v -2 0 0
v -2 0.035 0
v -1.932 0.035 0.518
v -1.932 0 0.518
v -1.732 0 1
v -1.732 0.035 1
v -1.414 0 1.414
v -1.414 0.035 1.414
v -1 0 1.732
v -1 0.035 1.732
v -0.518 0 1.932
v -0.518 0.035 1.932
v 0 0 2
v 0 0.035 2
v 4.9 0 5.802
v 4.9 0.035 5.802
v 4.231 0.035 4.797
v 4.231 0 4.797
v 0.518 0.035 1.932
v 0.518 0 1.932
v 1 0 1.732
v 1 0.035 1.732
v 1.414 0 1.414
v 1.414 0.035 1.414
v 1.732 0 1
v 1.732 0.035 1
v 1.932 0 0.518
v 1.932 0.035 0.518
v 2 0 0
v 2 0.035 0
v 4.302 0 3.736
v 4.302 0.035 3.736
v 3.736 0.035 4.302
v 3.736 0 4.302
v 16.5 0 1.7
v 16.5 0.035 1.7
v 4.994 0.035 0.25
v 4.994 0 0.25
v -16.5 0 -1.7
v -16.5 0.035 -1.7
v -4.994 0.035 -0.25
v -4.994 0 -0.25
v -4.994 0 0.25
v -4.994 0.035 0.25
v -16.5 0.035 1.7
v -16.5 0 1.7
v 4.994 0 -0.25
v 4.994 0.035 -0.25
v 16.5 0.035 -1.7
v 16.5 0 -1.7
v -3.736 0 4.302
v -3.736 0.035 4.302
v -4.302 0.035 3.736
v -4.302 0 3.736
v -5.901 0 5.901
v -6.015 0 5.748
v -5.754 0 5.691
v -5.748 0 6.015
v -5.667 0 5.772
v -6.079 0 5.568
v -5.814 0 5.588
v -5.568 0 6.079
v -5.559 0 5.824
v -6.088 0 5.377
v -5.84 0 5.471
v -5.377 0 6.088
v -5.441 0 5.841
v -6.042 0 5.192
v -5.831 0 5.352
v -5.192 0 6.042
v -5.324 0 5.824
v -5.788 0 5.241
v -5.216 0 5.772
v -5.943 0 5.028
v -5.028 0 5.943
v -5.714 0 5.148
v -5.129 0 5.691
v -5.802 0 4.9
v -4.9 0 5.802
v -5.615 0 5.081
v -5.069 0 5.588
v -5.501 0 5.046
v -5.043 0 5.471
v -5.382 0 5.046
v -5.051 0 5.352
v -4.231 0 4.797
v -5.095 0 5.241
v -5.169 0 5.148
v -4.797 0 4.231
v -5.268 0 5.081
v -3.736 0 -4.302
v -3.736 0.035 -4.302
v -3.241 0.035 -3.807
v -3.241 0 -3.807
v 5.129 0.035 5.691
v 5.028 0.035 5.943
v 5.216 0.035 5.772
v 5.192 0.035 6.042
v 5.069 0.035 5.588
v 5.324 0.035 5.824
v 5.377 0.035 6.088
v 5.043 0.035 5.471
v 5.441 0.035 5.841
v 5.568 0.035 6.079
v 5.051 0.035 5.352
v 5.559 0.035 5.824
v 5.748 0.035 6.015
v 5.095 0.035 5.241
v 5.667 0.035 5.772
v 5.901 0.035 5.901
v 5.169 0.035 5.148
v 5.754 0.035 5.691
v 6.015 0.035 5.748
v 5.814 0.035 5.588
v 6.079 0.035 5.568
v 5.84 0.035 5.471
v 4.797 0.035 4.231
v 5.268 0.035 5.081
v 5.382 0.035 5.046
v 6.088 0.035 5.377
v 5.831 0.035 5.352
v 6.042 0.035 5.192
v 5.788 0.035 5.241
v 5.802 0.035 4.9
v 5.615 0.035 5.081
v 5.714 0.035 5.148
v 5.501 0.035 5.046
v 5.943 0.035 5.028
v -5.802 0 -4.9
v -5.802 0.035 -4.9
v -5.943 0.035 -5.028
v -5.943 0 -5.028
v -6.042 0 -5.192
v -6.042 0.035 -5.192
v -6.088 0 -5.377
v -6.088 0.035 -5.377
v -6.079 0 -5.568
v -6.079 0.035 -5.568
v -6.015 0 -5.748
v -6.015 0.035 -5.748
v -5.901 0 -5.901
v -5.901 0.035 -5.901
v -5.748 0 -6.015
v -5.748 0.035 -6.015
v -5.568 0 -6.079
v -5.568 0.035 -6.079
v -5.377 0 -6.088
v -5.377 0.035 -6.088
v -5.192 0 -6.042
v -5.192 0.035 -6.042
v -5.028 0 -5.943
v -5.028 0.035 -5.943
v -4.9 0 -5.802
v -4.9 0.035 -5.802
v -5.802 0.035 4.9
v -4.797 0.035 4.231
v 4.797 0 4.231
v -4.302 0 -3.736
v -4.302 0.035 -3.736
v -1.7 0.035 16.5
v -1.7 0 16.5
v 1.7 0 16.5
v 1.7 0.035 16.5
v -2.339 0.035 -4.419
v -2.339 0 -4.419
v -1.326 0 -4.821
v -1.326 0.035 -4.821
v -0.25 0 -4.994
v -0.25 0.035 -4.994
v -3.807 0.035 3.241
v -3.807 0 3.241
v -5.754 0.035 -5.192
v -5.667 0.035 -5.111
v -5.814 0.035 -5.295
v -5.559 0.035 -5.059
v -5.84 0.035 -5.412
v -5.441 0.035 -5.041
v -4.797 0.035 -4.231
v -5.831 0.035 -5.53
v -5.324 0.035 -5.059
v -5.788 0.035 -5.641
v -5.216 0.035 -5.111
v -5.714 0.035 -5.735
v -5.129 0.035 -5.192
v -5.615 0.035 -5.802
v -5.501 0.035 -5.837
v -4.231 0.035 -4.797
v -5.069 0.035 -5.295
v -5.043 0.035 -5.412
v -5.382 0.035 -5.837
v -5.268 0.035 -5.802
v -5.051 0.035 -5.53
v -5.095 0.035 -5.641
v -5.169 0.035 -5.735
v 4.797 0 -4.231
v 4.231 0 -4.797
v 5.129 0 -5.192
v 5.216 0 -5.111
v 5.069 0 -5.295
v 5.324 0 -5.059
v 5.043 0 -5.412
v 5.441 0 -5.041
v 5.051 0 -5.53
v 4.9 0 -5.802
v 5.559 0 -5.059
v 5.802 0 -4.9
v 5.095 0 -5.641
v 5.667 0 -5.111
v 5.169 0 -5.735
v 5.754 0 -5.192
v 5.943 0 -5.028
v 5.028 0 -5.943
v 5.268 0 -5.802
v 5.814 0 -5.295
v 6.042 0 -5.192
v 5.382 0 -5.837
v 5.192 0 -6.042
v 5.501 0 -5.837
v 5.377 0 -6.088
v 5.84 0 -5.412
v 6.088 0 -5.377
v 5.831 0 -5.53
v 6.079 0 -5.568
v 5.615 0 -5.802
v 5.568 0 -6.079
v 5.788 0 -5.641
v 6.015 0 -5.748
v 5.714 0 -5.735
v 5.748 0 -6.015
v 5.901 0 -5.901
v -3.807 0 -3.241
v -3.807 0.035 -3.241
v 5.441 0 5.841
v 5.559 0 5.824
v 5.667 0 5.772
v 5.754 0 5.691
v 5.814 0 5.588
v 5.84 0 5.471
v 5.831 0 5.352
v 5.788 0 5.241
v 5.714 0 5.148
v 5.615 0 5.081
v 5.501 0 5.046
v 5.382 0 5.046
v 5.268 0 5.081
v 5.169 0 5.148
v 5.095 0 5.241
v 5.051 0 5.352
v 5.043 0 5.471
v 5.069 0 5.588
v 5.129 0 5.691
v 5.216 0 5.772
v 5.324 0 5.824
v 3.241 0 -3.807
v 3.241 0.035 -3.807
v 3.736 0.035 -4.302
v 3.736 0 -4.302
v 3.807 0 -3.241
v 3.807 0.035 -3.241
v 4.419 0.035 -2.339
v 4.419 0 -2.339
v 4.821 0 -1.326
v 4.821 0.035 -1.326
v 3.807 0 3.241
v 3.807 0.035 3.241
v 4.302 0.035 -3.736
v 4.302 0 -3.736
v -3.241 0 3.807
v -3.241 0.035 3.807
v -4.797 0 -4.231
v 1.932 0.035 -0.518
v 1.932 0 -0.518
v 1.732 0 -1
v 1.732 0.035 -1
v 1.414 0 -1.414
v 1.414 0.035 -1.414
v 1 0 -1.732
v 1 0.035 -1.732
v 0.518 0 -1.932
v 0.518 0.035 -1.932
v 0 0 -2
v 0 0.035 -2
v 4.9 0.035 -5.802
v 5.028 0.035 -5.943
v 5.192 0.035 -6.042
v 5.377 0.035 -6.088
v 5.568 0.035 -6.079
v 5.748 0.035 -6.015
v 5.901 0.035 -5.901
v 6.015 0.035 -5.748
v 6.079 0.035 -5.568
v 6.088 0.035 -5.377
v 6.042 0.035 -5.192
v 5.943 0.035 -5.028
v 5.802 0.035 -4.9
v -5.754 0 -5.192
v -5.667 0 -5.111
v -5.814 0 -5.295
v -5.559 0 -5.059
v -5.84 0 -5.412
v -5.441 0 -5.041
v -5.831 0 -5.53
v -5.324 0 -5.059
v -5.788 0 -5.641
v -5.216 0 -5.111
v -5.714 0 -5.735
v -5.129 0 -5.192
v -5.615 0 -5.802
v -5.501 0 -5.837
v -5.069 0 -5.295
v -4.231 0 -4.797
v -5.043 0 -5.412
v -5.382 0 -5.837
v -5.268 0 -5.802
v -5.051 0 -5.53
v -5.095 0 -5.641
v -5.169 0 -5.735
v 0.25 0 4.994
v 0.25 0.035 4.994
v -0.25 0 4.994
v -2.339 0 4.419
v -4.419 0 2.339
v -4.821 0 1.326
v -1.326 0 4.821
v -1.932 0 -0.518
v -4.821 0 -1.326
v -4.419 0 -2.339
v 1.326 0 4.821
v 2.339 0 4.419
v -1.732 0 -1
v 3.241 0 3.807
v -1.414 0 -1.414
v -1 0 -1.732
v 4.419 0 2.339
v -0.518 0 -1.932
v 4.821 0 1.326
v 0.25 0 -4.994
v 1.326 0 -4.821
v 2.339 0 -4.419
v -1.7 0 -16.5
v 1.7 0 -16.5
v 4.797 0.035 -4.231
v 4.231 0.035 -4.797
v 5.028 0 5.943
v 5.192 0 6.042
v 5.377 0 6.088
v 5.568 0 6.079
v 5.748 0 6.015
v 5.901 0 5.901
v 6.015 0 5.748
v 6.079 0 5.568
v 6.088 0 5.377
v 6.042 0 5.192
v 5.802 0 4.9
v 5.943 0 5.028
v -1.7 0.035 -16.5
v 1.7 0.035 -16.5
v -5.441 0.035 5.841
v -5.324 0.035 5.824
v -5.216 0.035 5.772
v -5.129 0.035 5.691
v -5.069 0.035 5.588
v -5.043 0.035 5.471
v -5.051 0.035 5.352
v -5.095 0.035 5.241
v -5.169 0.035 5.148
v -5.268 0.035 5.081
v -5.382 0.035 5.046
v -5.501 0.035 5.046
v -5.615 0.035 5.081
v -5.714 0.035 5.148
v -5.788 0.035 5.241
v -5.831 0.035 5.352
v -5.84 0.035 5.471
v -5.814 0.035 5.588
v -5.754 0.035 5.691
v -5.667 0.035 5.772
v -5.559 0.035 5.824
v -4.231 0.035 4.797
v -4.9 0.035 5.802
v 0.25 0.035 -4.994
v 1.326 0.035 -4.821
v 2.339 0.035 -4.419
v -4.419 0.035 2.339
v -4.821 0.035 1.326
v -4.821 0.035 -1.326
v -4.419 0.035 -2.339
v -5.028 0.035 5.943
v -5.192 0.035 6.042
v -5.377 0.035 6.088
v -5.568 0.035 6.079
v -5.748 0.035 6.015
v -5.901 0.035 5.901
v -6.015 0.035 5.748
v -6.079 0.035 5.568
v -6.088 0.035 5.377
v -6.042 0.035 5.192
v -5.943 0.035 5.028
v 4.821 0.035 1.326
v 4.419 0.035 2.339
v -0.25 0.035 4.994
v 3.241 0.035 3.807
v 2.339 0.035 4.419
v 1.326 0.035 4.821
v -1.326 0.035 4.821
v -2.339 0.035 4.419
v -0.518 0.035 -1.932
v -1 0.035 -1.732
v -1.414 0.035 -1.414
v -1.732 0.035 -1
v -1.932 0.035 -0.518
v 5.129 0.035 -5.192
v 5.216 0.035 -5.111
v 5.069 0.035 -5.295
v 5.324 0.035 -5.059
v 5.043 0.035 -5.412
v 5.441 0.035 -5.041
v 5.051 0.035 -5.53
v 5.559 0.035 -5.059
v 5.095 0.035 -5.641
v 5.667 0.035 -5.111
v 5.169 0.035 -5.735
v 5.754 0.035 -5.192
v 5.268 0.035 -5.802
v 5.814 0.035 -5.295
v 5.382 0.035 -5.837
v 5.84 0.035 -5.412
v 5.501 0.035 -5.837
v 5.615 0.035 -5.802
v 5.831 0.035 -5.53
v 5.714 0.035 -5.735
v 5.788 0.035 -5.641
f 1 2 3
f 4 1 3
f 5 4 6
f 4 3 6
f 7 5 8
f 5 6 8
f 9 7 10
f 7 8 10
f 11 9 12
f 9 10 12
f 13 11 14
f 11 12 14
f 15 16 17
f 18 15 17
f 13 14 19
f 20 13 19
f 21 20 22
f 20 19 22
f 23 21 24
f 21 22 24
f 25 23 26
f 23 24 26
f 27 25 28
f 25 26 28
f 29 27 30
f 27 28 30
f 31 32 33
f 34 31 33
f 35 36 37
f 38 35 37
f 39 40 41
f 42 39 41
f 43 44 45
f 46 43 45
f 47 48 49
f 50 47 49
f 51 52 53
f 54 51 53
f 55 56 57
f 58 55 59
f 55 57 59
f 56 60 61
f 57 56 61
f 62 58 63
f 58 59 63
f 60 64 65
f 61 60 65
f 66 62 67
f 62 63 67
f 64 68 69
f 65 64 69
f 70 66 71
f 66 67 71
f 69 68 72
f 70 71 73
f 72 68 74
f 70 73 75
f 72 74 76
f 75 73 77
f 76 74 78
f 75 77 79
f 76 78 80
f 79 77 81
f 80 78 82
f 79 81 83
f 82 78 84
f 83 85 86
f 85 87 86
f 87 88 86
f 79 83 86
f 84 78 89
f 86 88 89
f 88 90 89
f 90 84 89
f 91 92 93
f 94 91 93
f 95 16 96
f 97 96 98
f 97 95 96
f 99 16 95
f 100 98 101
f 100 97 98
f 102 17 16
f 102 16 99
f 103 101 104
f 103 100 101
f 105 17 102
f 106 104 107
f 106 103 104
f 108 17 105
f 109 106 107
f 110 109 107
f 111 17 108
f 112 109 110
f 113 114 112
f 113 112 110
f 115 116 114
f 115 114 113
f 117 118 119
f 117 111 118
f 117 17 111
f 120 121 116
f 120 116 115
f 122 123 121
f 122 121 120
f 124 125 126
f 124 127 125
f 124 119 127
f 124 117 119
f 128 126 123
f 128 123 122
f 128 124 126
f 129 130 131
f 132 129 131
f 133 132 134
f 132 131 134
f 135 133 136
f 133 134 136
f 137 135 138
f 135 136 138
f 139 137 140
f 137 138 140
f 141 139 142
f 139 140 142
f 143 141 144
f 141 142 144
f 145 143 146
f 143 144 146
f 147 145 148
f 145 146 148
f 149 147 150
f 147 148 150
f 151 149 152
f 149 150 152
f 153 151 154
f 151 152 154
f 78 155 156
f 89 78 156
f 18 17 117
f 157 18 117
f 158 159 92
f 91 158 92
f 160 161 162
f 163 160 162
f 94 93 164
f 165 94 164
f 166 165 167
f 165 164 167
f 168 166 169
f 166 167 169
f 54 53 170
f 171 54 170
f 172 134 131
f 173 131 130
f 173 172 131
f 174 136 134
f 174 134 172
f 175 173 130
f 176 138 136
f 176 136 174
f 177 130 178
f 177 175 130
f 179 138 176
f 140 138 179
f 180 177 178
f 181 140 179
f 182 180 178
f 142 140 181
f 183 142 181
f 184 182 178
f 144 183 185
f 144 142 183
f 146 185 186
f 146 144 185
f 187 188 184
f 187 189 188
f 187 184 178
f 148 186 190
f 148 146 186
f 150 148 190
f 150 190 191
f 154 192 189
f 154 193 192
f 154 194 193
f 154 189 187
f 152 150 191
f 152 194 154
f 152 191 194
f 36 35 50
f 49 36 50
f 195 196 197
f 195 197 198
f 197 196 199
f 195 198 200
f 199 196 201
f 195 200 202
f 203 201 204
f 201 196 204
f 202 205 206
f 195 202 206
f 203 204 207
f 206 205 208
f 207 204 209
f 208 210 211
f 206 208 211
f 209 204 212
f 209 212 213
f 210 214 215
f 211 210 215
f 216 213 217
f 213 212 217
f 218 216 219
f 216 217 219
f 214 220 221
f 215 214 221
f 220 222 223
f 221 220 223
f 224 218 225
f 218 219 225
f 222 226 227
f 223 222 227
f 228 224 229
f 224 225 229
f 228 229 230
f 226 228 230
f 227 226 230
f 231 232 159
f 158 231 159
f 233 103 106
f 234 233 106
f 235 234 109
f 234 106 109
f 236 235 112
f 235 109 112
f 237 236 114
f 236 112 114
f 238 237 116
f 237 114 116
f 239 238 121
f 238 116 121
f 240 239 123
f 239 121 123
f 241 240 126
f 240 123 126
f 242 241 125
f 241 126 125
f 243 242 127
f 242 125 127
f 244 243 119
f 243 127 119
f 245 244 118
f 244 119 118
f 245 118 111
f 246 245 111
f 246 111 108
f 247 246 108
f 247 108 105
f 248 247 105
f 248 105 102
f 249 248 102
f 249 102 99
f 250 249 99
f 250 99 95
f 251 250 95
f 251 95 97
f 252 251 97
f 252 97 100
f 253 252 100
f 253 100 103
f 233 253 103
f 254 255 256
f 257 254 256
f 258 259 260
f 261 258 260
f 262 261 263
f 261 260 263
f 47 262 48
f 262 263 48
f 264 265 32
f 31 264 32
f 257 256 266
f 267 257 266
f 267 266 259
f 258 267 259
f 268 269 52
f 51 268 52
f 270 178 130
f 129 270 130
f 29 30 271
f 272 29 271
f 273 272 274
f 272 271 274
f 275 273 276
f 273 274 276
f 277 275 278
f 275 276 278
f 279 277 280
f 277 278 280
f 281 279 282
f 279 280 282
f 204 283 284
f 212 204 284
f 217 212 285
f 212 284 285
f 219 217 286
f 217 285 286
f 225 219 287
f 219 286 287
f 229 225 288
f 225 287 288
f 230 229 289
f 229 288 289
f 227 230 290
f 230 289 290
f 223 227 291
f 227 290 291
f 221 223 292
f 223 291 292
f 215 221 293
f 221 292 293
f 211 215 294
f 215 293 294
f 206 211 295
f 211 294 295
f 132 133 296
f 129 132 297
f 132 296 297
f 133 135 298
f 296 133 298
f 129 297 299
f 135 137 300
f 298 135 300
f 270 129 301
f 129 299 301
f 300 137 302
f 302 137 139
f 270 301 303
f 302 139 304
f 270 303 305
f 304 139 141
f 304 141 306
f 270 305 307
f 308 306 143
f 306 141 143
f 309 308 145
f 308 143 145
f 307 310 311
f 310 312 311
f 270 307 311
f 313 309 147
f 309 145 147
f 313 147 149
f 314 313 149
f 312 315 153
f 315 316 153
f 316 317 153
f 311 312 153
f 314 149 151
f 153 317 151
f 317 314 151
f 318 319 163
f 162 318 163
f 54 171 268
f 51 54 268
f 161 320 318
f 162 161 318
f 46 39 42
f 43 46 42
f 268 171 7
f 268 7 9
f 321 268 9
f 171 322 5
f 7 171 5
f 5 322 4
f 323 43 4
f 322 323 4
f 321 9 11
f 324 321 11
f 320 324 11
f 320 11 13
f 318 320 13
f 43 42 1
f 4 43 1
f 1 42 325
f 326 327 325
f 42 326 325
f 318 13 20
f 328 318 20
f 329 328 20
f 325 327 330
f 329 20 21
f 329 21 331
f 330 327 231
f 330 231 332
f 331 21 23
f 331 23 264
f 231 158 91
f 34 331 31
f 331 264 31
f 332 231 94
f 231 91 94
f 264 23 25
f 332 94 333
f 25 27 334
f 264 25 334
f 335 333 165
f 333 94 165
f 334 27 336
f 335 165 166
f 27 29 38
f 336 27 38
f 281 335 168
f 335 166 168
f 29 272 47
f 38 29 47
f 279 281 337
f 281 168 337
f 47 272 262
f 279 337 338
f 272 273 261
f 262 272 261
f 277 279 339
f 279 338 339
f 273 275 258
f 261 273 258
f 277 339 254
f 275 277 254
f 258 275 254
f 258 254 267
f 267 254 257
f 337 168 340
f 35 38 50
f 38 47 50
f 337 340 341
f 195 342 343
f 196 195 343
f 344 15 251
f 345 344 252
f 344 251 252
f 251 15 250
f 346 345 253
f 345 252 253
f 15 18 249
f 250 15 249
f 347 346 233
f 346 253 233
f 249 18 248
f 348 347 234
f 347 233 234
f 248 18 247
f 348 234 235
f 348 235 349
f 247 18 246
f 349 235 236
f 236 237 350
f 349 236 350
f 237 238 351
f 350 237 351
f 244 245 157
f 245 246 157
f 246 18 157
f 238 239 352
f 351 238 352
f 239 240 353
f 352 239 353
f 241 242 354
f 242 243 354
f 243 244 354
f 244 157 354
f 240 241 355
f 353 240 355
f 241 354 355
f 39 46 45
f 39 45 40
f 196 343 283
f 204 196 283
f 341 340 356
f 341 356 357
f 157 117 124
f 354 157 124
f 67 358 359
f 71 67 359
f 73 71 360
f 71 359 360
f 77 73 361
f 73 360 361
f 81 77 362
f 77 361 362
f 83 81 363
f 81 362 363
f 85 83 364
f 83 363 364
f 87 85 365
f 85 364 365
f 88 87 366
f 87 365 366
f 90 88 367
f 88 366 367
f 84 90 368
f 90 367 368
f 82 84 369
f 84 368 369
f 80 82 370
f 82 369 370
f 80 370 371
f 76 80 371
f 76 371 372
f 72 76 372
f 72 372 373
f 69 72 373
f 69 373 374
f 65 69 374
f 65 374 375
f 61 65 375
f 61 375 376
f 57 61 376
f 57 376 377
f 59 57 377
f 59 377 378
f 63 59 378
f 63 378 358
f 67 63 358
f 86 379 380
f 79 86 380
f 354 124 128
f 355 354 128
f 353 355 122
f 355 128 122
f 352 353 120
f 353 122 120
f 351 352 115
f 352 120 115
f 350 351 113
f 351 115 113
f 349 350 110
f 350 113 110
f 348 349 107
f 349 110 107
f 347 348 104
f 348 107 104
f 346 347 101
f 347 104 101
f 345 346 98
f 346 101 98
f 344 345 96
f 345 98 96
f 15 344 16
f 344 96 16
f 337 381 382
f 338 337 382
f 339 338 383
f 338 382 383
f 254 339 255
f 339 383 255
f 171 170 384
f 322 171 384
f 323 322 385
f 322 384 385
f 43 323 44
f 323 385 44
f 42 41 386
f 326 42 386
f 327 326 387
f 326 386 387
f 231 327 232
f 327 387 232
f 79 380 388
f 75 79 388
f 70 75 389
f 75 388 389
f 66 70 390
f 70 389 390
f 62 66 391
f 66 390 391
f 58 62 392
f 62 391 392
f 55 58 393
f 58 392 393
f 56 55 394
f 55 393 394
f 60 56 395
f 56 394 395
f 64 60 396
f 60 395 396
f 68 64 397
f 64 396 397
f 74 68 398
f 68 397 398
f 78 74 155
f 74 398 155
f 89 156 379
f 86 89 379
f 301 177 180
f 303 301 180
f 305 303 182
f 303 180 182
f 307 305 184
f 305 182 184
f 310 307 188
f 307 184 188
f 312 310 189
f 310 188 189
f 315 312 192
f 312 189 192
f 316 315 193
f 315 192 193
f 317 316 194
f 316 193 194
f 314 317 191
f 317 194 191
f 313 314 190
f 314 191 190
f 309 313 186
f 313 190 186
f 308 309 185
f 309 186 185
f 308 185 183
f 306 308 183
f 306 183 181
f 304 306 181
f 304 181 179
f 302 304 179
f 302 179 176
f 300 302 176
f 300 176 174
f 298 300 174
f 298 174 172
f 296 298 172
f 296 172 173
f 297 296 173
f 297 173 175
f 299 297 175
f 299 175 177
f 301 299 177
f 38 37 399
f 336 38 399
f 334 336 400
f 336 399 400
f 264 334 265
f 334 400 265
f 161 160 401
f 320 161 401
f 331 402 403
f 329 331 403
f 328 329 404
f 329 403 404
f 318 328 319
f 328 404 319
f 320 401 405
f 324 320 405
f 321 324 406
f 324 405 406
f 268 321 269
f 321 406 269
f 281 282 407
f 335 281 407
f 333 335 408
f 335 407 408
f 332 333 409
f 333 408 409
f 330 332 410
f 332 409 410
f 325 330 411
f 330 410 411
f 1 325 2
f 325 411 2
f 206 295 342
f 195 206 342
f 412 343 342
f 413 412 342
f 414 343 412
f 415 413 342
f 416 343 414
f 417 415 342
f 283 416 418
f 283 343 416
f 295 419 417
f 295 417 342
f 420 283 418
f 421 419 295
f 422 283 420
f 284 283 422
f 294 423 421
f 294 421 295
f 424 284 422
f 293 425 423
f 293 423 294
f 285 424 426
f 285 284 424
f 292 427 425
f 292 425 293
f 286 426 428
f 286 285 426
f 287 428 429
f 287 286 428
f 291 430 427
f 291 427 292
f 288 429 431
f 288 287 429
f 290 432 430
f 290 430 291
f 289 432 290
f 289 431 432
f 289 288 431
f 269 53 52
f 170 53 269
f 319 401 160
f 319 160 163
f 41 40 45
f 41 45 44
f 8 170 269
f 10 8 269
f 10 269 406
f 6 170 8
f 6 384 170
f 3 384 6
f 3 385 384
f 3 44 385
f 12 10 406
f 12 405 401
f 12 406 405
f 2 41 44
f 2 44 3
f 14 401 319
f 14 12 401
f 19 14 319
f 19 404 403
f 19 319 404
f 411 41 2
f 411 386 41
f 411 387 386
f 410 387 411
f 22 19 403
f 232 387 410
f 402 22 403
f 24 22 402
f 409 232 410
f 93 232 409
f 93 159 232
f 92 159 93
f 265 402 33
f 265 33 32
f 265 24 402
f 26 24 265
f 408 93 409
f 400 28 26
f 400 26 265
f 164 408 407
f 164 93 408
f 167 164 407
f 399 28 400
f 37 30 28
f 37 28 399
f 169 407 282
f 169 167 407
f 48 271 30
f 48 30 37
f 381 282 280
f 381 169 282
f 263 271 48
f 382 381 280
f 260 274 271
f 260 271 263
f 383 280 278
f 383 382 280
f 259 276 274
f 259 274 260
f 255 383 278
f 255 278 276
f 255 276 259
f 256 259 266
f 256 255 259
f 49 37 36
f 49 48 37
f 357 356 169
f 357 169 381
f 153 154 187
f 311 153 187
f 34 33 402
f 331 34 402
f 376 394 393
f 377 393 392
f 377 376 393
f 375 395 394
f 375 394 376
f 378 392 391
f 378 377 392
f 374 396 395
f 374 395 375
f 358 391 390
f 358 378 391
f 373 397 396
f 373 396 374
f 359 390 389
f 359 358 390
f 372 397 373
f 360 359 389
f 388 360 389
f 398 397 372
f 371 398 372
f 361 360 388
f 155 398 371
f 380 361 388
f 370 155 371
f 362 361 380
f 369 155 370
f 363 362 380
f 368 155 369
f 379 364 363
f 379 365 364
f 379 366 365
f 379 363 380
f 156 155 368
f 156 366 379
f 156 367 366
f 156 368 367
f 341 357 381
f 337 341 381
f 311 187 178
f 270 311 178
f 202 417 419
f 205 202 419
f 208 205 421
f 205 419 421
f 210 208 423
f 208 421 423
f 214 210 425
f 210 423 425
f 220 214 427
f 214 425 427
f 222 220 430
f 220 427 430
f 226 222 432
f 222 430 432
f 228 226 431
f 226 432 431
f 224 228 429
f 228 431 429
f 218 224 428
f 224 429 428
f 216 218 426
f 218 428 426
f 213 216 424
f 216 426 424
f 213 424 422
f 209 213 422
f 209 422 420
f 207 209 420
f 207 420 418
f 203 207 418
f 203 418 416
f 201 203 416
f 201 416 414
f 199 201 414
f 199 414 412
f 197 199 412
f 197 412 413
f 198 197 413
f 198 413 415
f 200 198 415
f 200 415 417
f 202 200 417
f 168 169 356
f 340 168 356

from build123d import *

# Parameters (mm, degrees)
SKETCH1_W           = 33
SKETCH1_H           = 33
BOSS_EXTRUDE1_DEPTH = 0.035
SKETCH3_R           = 0.4
CUT_EXTRUDE2_DEPTH  = 24.334550028


with BuildPart() as part:
    # Sketch1 → Boss-Extrude1 (new body)
    with BuildSketch(Plane(origin=(0, 0, 0), x_dir=(1, 0, 0), z_dir=(0, 1, 0))):
        Rectangle(SKETCH1_W, SKETCH1_H)
    extrude(amount=BOSS_EXTRUDE1_DEPTH)

    # Sketch3 → Cut-Extrude2 (cut, through all)
    # profile 1 of 9: a face of its own
    with BuildSketch(Plane(origin=(0, 0.035, 0), x_dir=(1, 0, 0), z_dir=(0, 1, 0))):
        with BuildLine():
            Line((-4.993746089, -0.25), (-16.5, -1.7))
            Line((-16.5, -1.7), (-16.5, -16.5))
            Line((-16.5, -16.5), (-1.7, -16.5))
            Line((-1.7, -16.5), (-0.25, -4.993746089))
            ThreePointArc((-0.25, -4.993746089), (-1.843763136, -4.647637841), (-3.241359325, -3.80704475))
            Line((-3.241359325, -3.80704475), (-3.736334072, -4.302019497))
            Line((-3.736334072, -4.302019497), (-4.302019497, -3.736334072))
            Line((-4.302019497, -3.736334072), (-3.80704475, -3.241359325))
            ThreePointArc((-3.80704475, -3.241359325), (-4.647637841, -1.843763136), (-4.993746089, -0.25))
        make_face()
        with BuildLine():
            ThreePointArc((-4.900453872, -5.80175516), (-5.901078763, -5.901078763), (-5.80175516, -4.900453872))
            Line((-5.80175516, -4.900453872), (-4.796994243, -4.231308819))
            Line((-4.796994243, -4.231308819), (-4.231308819, -4.796994243))
            Line((-4.231308819, -4.796994243), (-4.900453872, -5.80175516))
        make_face(mode=Mode.SUBTRACT)
    # profile 2 of 9: a face of its own
    with BuildSketch(Plane(origin=(0, 0.035, 0), x_dir=(1, 0, 0), z_dir=(0, 1, 0))):
        with BuildLine():
            ThreePointArc((0, 2), (-1.414213562, 1.414213562), (-2, 0))
            ThreePointArc((-2, 0), (-1.414213562, -1.414213562), (0, -2))
            ThreePointArc((0, -2), (1.414213562, -1.414213562), (2, 0))
            ThreePointArc((2, 0), (1.414213562, 1.414213562), (0, 2))
        make_face()
    # profile 3 of 9: a face of its own
    with BuildSketch(Plane(origin=(0, 0.035, 0), x_dir=(1, 0, 0), z_dir=(0, 1, 0))):
        with BuildLine():
            Line((-16.5, 16.5), (-16.5, 1.7))
            Line((-16.5, 1.7), (-4.993746089, 0.25))
            ThreePointArc((-4.993746089, 0.25), (-4.647637841, 1.843763136), (-3.80704475, 3.241359325))
            Line((-3.80704475, 3.241359325), (-4.302019497, 3.736334072))
            Line((-4.302019497, 3.736334072), (-3.736334072, 4.302019497))
            Line((-3.736334072, 4.302019497), (-3.241359325, 3.80704475))
            ThreePointArc((-3.241359325, 3.80704475), (-1.843763136, 4.647637841), (-0.25, 4.993746089))
            Line((-0.25, 4.993746089), (-1.7, 16.5))
            Line((-1.7, 16.5), (-16.5, 16.5))
        make_face()
        with BuildLine():
            ThreePointArc((-5.80175516, 4.900453872), (-5.901078763, 5.901078763), (-4.900453872, 5.80175516))
            Line((-4.900453872, 5.80175516), (-4.231308819, 4.796994243))
            Line((-4.231308819, 4.796994243), (-4.796994243, 4.231308819))
            Line((-4.796994243, 4.231308819), (-5.80175516, 4.900453872))
        make_face(mode=Mode.SUBTRACT)
    # profile 4 of 9: a face of its own
    with BuildSketch(Plane(origin=(0, 0.035, 0), x_dir=(1, 0, 0), z_dir=(0, 1, 0))):
        with Locations(Location((-5.441459355, -5.441459355, 0), (0, 0, 270))):
            Circle(SKETCH3_R)
    # profile 5 of 9: a face of its own
    with BuildSketch(Plane(origin=(0, 0.035, 0), x_dir=(1, 0, 0), z_dir=(0, 1, 0))):
        with BuildLine():
            Line((0.25, -4.993746089), (1.7, -16.5))
            Line((1.7, -16.5), (16.5, -16.5))
            Line((16.5, -16.5), (16.5, -1.7))
            Line((16.5, -1.7), (4.993746089, -0.25))
            ThreePointArc((4.993746089, -0.25), (4.647637841, -1.843763136), (3.80704475, -3.241359325))
            Line((3.80704475, -3.241359325), (4.302019497, -3.736334072))
            Line((4.302019497, -3.736334072), (3.736334072, -4.302019497))
            Line((3.736334072, -4.302019497), (3.241359325, -3.80704475))
            ThreePointArc((3.241359325, -3.80704475), (1.843763136, -4.647637841), (0.25, -4.993746089))
        make_face()
        with BuildLine():
            ThreePointArc((5.80175516, -4.900453872), (5.901078763, -5.901078763), (4.900453872, -5.80175516))
            Line((4.900453872, -5.80175516), (4.231308819, -4.796994243))
            Line((4.231308819, -4.796994243), (4.796994243, -4.231308819))
            Line((4.796994243, -4.231308819), (5.80175516, -4.900453872))
        make_face(mode=Mode.SUBTRACT)
    # profile 6 of 9: a face of its own
    with BuildSketch(Plane(origin=(0, 0.035, 0), x_dir=(1, 0, 0), z_dir=(0, 1, 0))):
        with BuildLine():
            Line((16.5, 16.5), (1.7, 16.5))
            Line((1.7, 16.5), (0.25, 4.993746089))
            ThreePointArc((0.25, 4.993746089), (1.843763136, 4.647637841), (3.241359325, 3.80704475))
            Line((3.241359325, 3.80704475), (3.736334072, 4.302019497))
            Line((3.736334072, 4.302019497), (4.302019497, 3.736334072))
            Line((4.302019497, 3.736334072), (3.80704475, 3.241359325))
            ThreePointArc((3.80704475, 3.241359325), (4.647637841, 1.843763136), (4.993746089, 0.25))
            Line((4.993746089, 0.25), (16.5, 1.7))
            Line((16.5, 1.7), (16.5, 16.5))
        make_face()
        with BuildLine():
            ThreePointArc((4.900453872, 5.80175516), (5.901078763, 5.901078763), (5.80175516, 4.900453872))
            Line((5.80175516, 4.900453872), (4.796994243, 4.231308819))
            Line((4.796994243, 4.231308819), (4.231308819, 4.796994243))
            Line((4.231308819, 4.796994243), (4.900453872, 5.80175516))
        make_face(mode=Mode.SUBTRACT)
    # profile 7 of 9: a face of its own
    with BuildSketch(Plane(origin=(0, 0.035, 0), x_dir=(1, 0, 0), z_dir=(0, 1, 0))):
        with Locations(Location((5.441459355, 5.441459355, 0), (0, 0, 270))):
            Circle(SKETCH3_R)
    # profile 8 of 9: a face of its own
    with BuildSketch(Plane(origin=(0, 0.035, 0), x_dir=(1, 0, 0), z_dir=(0, 1, 0))):
        with Locations(Location((-5.441459355, 5.441459355, 0), (0, 0, 270))):
            Circle(SKETCH3_R)
    # profile 9 of 9: a face of its own
    with BuildSketch(Plane(origin=(0, 0.035, 0), x_dir=(1, 0, 0), z_dir=(0, 1, 0))):
        with Locations(Location((5.441459355, -5.441459355, 0), (0, 0, 270))):
            Circle(SKETCH3_R)
    extrude(amount=-CUT_EXTRUDE2_DEPTH, mode=Mode.SUBTRACT)


with BuildPart() as cut_extrude2_piece_1:
    # of the separate pieces the step leaves, piece 1, a body of its own (cut_extrude2_pieces)
    add(part.part.solids().sort_by_distance((-1.7, 0, 16.5))[0])


with BuildPart() as cut_extrude2_piece_2:
    # of the separate pieces the step leaves, piece 2, a body of its own (cut_extrude2_pieces)
    add(part.part.solids().sort_by_distance((5.80175516, 0, -4.900453872))[0])


with BuildPart() as cut_extrude2_piece_3:
    # of the separate pieces the step leaves, piece 3, a body of its own (cut_extrude2_pieces)
    add(part.part.solids().sort_by_distance((-5.80175516, 0, 4.900453872))[0])


with BuildPart() as cut_extrude2_piece_4:
    # of the separate pieces the step leaves, piece 4, a body of its own (cut_extrude2_pieces)
    add(part.part.solids().sort_by_distance((-4.900453872, 0, -5.80175516))[0])


with BuildPart() as cut_extrude2_piece_5:
    # of the separate pieces the step leaves, piece 5, a body of its own (cut_extrude2_pieces)
    add(part.part.solids().sort_by_distance((4.900453872, 0, 5.80175516))[0])


solid = Compound([cut_extrude2_piece_1.part, cut_extrude2_piece_2.part, cut_extrude2_piece_3.part, cut_extrude2_piece_4.part, cut_extrude2_piece_5.part])
